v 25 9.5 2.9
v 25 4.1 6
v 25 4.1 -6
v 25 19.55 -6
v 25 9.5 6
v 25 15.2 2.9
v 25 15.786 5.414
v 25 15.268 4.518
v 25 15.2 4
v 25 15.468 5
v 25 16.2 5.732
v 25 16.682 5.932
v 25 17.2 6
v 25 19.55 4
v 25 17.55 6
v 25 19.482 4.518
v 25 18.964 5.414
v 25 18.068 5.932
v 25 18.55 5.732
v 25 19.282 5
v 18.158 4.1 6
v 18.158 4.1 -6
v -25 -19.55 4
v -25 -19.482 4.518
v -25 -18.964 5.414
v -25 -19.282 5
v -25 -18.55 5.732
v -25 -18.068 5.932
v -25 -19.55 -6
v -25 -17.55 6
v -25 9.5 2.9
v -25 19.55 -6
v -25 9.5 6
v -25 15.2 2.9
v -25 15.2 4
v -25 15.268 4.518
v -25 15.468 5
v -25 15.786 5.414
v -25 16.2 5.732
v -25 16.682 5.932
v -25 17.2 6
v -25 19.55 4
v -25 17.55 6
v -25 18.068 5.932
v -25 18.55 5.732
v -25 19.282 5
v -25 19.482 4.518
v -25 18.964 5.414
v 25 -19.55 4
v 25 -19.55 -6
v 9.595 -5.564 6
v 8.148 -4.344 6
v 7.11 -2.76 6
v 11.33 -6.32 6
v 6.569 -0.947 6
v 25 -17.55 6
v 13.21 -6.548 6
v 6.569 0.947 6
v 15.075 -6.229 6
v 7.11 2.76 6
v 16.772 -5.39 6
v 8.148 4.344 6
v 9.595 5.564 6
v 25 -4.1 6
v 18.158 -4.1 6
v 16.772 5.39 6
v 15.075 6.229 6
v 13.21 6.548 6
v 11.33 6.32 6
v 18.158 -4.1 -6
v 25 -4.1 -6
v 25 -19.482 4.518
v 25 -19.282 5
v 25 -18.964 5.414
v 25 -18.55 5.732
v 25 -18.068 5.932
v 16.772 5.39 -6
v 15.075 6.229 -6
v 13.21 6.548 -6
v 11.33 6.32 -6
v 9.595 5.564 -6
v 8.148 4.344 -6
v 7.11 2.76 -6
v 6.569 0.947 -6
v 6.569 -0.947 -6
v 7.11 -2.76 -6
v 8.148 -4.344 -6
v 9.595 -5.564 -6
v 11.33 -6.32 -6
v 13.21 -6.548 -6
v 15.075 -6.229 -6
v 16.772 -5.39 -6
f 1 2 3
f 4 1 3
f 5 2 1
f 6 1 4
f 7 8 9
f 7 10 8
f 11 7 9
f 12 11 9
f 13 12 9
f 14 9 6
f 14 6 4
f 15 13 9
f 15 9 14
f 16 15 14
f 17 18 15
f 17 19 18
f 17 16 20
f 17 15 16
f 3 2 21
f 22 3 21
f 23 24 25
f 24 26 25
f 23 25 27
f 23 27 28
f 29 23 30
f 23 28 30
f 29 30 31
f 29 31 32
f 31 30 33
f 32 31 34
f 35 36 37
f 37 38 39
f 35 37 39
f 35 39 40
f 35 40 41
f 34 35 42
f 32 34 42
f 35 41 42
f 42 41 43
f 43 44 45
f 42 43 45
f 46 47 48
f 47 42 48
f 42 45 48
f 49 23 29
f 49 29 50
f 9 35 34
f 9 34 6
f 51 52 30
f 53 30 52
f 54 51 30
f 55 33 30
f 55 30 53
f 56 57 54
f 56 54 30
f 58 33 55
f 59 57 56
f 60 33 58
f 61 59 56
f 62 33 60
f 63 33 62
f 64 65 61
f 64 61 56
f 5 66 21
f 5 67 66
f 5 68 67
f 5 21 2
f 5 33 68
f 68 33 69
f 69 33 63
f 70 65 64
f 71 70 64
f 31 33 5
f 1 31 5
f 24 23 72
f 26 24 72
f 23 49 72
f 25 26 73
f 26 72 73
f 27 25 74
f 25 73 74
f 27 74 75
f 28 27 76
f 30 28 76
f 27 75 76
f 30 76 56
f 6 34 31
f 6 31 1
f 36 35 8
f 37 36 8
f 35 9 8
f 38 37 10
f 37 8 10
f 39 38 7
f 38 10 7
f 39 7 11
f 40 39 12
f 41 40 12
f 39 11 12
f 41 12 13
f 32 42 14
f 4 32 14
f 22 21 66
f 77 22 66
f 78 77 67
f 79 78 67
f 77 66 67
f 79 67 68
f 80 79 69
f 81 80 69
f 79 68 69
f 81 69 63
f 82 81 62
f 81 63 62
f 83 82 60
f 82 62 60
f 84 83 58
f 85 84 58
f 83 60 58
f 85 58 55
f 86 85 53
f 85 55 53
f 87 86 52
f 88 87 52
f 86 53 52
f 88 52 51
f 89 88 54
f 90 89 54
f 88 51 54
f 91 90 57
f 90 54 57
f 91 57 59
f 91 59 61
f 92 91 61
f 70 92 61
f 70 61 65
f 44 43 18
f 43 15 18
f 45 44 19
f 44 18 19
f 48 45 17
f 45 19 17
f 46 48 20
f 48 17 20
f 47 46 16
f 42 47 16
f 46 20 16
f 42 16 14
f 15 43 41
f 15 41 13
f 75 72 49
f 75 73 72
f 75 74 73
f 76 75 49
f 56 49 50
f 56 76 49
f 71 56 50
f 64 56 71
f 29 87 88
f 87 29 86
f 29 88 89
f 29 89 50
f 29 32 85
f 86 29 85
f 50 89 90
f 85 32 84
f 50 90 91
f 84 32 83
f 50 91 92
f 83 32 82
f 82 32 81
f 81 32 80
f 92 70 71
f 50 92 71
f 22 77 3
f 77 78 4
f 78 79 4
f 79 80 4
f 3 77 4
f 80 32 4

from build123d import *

# Parameters (mm, degrees)
F0_W     = 50
F0_H     = 39.1
F1_DEPTH = 6
F2_W     = 50
F2_H     = 5.7
F3_DEPTH = 3.1
F4_DEPTH = 12
F5_R     = 2


with BuildPart() as f1:
    # F0 (on Top) → F1 (new body, symmetric)
    with BuildSketch(Plane.XY):
        Rectangle(F0_W, F0_H)
    extrude(amount=F1_DEPTH, both=True)

    # F2 (on face) → F3 (cut)
    with BuildSketch(Plane.XY.offset(6)):
        with Locations((0, 12.35)):
            Rectangle(F2_W, F2_H)
    extrude(amount=-F3_DEPTH, mode=Mode.SUBTRACT)

    # F2 (on face) → F4 (cut, through all)
    with BuildSketch(Plane.XY.offset(6)):
        with BuildLine():
            Line((25, -4.1), (25, 0))
            Line((25, 0), (25, 4.1))
            Line((25, 4.1), (18.1580818318, 4.1))
            ThreePointArc((18.1580818318, 4.1), (6.5, 0), (18.1580818318, -4.1))
            Line((18.1580818318, -4.1), (25, -4.1))
        make_face()
    extrude(amount=-F4_DEPTH, mode=Mode.SUBTRACT)

    # F5
    f5_edges = [f1.edges().sort_by_distance(p)[0] for p in [
        (0, -19.55, 6),
        (0, 15.2, 6),
        (0, 19.55, 6),
    ]]
    fillet(f5_edges, radius=F5_R)


solid = f1.part
